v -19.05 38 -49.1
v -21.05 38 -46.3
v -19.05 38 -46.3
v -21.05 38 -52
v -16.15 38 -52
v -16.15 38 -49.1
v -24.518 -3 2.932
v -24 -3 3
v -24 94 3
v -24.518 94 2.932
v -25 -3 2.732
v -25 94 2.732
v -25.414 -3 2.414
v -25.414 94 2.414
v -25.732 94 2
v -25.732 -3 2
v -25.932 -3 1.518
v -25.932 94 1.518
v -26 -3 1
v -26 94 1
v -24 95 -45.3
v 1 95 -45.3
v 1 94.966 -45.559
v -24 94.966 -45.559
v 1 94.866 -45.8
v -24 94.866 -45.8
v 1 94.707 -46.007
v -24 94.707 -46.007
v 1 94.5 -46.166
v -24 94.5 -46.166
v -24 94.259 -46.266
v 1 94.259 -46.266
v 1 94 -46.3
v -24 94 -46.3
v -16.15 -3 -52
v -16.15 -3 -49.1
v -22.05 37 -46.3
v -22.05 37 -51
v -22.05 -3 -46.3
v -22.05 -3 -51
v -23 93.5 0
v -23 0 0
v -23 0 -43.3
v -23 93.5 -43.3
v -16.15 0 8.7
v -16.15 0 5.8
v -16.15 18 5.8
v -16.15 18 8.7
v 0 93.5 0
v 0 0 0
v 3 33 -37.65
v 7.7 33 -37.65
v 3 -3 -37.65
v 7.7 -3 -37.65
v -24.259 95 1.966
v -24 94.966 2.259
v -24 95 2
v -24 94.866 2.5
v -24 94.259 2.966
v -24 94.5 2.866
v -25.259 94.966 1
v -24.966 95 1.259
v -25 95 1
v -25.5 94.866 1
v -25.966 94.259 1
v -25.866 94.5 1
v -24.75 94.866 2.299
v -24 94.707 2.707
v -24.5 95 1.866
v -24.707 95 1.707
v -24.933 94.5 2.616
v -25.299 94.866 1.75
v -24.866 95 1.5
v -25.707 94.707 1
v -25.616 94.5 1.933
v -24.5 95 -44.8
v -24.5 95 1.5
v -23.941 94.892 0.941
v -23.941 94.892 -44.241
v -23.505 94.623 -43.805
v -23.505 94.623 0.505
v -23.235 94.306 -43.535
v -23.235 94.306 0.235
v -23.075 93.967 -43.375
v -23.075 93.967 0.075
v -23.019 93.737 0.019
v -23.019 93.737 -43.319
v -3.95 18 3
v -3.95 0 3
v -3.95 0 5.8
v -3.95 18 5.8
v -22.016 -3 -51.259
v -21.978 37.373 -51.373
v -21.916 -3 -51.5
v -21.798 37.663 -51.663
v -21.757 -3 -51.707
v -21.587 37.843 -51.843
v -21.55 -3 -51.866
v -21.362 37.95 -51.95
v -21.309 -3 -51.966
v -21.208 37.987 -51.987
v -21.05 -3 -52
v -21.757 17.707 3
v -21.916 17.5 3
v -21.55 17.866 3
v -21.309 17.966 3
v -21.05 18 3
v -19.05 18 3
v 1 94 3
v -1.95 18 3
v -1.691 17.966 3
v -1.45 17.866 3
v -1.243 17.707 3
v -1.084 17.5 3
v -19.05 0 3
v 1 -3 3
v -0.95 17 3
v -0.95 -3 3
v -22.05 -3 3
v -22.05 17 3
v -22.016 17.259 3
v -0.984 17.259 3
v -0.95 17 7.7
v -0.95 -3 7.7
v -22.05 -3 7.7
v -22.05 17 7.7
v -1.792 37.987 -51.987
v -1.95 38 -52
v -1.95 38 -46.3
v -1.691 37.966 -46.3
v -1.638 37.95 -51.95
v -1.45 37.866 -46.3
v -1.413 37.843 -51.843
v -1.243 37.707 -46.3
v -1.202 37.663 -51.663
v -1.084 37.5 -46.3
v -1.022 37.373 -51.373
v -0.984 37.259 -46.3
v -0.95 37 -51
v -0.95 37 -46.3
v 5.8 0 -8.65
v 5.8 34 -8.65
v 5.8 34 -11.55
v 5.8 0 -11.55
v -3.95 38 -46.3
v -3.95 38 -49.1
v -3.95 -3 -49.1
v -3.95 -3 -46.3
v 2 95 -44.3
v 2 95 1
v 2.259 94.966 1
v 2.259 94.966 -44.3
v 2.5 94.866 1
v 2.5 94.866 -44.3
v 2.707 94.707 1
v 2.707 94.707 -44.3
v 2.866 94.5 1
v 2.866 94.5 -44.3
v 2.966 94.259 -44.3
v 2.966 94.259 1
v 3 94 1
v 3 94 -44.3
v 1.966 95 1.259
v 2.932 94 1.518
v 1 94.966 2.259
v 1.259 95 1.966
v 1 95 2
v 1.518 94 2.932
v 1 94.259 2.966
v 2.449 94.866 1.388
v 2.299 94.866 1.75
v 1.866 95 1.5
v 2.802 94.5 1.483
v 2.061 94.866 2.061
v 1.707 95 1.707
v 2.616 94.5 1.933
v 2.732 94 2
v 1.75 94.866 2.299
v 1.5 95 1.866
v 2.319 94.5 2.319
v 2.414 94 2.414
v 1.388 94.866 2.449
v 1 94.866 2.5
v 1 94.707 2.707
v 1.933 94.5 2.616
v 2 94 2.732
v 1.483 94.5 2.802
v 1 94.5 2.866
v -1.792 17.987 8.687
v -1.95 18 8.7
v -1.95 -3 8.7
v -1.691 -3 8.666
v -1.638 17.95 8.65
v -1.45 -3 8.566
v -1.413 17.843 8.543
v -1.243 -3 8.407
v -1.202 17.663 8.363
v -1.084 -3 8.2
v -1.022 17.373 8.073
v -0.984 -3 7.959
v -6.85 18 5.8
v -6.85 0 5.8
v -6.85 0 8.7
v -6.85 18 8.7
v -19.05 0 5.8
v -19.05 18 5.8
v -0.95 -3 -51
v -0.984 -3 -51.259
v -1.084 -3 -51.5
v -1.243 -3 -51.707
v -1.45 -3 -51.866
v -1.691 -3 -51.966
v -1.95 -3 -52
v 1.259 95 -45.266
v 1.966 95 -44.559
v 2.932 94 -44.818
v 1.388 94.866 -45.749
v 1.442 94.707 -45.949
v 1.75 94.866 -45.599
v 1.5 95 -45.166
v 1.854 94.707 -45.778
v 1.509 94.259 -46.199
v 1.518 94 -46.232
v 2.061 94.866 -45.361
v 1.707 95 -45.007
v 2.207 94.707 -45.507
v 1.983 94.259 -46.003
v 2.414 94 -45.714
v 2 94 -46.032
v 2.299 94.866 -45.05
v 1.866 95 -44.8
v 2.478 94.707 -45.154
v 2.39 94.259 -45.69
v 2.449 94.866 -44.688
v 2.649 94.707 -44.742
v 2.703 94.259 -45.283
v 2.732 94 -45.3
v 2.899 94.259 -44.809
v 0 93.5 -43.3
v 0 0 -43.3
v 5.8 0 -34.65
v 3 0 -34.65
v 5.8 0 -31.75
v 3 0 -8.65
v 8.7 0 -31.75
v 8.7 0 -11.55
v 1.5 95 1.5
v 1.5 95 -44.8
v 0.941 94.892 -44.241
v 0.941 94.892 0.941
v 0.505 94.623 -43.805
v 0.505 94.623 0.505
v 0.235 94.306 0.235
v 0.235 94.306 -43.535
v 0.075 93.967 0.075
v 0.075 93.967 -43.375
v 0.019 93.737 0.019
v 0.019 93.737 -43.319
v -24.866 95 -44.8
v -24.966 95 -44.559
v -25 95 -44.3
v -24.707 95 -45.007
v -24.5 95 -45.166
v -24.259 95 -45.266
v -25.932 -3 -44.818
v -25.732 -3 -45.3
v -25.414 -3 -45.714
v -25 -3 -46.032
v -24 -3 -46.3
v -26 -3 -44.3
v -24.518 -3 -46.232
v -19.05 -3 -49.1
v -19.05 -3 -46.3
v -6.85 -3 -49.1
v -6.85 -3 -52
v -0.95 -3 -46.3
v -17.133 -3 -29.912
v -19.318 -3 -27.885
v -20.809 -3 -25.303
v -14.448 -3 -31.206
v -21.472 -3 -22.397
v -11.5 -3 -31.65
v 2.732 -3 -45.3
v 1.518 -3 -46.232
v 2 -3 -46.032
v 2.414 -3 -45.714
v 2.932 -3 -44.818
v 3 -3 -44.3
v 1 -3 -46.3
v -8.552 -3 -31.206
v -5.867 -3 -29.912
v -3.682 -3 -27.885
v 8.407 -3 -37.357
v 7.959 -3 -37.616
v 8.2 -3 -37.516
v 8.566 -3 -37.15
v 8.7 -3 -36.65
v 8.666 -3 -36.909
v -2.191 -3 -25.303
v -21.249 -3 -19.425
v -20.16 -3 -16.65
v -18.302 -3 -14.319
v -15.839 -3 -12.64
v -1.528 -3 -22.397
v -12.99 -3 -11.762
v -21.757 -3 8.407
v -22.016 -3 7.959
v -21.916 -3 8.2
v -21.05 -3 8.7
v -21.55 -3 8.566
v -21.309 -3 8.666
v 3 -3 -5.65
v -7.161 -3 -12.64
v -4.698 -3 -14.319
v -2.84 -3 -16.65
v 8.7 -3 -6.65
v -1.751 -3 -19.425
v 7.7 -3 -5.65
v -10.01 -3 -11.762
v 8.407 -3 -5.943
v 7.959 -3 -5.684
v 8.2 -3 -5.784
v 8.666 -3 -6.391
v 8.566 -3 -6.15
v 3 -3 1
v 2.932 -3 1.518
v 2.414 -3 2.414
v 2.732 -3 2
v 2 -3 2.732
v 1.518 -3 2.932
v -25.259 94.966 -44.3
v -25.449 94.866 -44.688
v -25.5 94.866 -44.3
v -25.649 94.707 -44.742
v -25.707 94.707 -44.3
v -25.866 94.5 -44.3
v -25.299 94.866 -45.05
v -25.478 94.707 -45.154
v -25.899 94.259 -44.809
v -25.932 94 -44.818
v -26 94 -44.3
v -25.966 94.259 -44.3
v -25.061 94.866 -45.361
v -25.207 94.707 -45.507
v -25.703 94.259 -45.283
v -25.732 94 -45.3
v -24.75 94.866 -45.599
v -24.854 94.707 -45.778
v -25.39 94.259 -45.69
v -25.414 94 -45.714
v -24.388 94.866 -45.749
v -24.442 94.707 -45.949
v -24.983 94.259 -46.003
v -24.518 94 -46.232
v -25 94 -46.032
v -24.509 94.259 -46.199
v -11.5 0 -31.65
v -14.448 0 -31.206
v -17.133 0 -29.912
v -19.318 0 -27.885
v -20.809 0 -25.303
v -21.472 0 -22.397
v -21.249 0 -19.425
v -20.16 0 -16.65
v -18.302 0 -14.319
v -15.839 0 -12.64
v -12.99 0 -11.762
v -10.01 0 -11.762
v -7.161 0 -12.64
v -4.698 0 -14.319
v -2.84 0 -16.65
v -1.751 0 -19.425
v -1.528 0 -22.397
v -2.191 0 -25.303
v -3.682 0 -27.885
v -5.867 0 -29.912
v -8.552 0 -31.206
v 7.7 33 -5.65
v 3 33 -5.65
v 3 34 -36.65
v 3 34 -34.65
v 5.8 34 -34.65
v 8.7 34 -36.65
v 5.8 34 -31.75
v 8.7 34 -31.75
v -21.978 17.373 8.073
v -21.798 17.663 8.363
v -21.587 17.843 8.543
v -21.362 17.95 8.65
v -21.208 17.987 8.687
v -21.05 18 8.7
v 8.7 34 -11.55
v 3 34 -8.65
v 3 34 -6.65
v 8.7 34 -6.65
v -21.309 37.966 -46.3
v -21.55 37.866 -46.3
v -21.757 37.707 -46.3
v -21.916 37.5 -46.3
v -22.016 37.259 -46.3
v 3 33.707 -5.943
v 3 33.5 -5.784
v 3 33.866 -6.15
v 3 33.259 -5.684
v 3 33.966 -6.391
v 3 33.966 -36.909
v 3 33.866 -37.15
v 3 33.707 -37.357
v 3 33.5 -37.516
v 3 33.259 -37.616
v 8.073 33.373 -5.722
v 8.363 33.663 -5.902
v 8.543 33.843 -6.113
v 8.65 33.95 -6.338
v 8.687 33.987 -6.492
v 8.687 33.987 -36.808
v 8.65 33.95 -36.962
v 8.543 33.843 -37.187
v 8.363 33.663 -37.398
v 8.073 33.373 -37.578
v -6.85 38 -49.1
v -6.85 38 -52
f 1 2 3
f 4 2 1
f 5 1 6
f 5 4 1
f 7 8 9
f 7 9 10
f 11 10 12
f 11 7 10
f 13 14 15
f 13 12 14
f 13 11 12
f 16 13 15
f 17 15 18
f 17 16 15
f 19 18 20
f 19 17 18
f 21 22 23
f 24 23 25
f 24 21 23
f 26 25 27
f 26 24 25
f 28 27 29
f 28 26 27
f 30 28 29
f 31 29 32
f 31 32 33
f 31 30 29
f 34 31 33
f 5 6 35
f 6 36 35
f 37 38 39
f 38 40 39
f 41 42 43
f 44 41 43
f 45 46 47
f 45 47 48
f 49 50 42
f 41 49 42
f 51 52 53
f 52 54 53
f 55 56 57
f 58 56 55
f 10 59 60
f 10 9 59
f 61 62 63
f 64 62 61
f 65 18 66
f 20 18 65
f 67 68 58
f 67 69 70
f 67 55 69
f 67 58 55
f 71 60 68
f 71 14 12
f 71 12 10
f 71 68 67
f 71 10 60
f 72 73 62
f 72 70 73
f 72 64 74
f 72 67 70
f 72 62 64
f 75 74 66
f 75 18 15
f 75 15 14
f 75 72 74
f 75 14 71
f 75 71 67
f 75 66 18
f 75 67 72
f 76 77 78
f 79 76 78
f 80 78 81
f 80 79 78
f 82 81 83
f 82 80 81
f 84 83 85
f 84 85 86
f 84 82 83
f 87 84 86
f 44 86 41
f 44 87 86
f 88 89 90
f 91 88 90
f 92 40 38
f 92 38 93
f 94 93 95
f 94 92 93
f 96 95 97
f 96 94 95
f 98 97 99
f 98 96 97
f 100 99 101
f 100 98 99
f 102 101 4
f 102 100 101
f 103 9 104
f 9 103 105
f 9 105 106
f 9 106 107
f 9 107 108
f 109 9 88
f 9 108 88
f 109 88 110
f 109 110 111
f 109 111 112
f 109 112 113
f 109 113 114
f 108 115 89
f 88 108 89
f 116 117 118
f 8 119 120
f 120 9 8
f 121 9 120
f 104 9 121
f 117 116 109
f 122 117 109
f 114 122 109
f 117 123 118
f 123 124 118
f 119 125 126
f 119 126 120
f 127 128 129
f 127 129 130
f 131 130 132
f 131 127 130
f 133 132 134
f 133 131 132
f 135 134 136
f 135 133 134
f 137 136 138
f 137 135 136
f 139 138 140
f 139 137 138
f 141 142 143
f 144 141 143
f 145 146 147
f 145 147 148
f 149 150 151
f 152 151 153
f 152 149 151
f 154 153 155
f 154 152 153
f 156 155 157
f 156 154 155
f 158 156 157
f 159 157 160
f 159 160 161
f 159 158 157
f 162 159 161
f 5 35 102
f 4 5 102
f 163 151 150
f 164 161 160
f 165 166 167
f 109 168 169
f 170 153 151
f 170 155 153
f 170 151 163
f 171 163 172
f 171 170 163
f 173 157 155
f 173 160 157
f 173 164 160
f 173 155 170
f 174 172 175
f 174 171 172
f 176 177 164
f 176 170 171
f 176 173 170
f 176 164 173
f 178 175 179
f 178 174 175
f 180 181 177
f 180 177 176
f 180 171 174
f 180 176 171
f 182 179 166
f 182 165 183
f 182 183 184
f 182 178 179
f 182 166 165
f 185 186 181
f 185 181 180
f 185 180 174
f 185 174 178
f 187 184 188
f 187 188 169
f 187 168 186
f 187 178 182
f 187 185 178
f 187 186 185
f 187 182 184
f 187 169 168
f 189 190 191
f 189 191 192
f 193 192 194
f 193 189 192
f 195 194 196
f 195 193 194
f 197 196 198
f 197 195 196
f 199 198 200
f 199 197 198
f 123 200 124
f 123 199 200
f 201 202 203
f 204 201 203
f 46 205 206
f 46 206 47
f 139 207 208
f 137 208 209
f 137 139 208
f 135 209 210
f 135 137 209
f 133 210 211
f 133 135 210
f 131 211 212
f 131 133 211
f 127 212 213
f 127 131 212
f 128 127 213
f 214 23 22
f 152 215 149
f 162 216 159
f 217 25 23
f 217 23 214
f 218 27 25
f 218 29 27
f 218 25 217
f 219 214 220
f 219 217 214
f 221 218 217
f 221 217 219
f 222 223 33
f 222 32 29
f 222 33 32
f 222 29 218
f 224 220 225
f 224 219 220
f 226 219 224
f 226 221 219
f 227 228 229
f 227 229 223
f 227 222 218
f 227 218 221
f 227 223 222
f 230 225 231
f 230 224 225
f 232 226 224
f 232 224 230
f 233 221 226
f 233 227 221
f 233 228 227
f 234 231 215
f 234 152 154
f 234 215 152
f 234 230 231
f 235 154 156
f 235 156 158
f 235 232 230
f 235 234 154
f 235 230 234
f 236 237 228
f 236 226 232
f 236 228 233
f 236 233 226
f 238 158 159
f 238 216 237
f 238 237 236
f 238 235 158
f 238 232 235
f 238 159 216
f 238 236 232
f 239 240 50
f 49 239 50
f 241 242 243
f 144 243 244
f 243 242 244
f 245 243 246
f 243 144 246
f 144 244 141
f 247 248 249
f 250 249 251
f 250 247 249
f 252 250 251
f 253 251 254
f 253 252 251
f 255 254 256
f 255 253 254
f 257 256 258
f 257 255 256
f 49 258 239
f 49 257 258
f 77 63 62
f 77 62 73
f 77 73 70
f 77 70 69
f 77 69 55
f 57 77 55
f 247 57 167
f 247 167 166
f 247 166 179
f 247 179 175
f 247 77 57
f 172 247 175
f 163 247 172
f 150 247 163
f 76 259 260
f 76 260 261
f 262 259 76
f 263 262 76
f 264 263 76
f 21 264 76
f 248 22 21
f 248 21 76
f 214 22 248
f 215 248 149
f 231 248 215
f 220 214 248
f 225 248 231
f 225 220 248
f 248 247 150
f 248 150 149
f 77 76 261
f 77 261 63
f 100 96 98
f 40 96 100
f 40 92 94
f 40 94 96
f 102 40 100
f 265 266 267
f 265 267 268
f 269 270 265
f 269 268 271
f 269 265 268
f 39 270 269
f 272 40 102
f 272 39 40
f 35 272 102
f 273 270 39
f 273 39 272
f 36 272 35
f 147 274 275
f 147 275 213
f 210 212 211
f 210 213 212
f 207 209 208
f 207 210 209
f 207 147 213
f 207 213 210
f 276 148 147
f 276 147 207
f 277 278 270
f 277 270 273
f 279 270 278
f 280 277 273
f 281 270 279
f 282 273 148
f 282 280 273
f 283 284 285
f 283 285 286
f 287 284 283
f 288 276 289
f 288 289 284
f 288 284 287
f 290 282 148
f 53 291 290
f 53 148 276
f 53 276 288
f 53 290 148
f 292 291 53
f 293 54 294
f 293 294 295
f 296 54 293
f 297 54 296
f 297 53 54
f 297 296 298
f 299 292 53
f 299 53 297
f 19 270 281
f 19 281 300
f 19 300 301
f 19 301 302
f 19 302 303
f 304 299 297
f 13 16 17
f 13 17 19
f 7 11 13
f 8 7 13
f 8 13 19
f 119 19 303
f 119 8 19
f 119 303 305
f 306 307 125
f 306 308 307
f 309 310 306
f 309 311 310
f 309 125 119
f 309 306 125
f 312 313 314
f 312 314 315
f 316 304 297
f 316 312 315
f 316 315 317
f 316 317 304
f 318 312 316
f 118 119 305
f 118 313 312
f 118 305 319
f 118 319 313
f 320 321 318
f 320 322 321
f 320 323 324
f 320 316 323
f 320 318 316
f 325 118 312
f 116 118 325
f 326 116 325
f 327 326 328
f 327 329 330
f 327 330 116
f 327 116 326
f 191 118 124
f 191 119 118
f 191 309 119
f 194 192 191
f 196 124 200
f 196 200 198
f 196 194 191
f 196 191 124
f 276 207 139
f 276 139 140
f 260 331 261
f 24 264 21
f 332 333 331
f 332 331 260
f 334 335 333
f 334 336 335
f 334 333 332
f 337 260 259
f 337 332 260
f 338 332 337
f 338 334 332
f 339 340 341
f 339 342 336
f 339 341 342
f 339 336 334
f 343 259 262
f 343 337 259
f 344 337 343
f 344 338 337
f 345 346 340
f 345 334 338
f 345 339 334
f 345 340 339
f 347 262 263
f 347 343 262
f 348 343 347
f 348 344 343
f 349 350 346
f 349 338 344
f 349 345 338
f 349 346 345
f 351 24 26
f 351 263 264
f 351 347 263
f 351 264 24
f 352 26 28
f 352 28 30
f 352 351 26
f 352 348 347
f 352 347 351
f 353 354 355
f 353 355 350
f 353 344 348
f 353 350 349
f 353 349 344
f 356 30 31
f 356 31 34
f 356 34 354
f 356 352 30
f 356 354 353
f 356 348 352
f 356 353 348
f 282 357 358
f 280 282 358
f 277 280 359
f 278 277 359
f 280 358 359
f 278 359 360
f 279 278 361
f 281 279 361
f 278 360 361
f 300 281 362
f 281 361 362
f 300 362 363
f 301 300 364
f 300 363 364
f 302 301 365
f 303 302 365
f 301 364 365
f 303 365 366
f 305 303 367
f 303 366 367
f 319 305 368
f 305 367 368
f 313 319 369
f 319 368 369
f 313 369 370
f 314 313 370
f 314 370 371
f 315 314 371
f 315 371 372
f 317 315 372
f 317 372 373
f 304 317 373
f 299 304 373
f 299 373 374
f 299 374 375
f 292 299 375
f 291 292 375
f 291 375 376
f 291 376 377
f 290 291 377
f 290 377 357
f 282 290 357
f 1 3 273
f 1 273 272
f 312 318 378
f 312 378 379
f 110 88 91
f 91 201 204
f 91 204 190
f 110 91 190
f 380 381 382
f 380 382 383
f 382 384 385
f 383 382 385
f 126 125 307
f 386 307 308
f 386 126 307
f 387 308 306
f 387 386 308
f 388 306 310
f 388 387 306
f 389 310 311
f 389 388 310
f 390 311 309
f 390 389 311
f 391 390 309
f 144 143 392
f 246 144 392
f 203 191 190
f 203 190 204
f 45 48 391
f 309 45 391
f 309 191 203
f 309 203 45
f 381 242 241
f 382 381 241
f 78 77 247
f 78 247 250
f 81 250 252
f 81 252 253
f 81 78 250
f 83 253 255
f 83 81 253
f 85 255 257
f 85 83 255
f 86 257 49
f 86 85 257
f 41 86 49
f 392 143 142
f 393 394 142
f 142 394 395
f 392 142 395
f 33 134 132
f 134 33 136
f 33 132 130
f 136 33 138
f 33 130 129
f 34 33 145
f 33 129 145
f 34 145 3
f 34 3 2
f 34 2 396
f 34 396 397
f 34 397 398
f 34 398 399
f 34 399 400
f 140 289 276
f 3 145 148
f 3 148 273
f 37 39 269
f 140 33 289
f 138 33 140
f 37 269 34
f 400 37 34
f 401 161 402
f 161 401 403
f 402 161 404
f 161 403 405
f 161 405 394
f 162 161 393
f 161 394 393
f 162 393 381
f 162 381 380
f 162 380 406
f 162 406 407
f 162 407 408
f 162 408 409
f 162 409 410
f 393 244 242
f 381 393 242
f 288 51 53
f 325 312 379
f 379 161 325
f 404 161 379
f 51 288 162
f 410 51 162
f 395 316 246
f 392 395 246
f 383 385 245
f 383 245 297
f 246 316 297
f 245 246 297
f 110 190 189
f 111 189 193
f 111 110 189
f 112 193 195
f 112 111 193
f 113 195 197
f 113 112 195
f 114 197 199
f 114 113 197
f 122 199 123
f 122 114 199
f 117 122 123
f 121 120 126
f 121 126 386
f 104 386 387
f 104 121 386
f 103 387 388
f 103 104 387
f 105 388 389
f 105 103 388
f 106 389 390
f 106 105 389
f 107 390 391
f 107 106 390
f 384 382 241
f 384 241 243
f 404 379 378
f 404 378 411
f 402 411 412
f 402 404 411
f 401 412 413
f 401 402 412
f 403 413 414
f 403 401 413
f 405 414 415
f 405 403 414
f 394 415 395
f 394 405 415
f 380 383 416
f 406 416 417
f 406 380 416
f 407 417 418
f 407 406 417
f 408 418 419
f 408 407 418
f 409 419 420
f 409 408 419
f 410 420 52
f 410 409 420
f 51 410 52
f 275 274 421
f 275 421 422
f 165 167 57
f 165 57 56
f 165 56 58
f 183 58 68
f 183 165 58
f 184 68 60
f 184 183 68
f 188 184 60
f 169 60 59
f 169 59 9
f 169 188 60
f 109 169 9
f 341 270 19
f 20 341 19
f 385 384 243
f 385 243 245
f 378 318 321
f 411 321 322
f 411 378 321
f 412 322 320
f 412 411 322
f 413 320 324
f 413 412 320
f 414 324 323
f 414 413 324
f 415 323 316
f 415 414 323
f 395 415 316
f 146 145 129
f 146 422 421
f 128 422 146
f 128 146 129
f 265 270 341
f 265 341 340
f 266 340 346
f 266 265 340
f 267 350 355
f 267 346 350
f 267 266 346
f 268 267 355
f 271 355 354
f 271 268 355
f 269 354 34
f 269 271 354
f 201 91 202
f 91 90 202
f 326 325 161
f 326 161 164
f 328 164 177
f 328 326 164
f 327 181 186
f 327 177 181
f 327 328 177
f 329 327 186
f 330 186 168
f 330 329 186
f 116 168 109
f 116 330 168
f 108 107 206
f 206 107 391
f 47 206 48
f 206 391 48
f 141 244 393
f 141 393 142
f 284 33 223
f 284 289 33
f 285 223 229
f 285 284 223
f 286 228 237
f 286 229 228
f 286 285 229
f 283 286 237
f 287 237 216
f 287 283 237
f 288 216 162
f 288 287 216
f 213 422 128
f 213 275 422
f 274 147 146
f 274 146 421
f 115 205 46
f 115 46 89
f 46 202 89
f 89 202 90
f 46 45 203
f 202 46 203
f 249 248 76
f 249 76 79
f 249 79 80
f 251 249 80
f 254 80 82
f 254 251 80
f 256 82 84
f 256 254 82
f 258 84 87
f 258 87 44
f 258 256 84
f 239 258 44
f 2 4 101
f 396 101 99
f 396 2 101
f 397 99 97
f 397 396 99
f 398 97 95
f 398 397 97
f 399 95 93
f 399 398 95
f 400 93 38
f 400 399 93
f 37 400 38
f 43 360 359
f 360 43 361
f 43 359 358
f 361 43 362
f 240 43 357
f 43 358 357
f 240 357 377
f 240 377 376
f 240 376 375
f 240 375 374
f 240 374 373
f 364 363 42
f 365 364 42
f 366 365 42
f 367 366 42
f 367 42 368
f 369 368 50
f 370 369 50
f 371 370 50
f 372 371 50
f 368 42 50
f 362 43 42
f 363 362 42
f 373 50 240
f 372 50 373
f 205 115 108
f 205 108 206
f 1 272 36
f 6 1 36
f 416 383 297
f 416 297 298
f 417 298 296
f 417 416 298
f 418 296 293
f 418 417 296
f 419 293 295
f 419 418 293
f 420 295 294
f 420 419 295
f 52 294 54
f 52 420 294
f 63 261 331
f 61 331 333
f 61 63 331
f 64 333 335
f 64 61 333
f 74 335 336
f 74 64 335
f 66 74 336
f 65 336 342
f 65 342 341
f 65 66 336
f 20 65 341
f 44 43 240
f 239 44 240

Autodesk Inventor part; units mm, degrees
ref_plane "YZ Plane" through (0, 0, 0) normal (1, 0, 0) x (0, 1, 0)
ref_plane "XZ Plane" through (0, 0, 0) normal (0, 1, 0) x (-1, 0, 0)
ref_plane "XY Plane" through (0, 0, 0) normal (0, 0, 1) x (1, 0, 0)
sketch "Boceto1" plane through (0, 0, 0) normal (0, 1, 0) x (-1, 0, 0)
  line L0 (0, 0) -> (23, 0)
  line L1 (23, 0) -> (23, -43.3)
  line L2 (23, -43.3) -> (0, -43.3)
  line L3 (0, -43.3) -> (0, 0)
  dimension "d0" = 23
  dimension "d1" = 43.3
ref_plane "Plano de trabajo1" through (0, 92, 0) normal (0, 1, 0) x (1, 0, 0)
sketch "Boceto2" plane through (0, 92, 0) normal (0, 1, 0) x (1, 0, 0)
  line L0 (0, 43.3) -> (-23, 43.3) projected
  line L1 (-23, 43.3) -> (-23, 0) projected
  line L2 (-23, 0) -> (0, 0) projected
  line L3 (0, 0) -> (0, 43.3) projected
  line L4 (-26, -1) -> (-26, 44.3)
  line L5 (-24, 46.3) -> (1, 46.3)
  line L6 (3, 44.3) -> (3, -1)
  line L7 (1, -3) -> (-24, -3)
  arc A0 (-26, -1) -> (-24, -3) centre (-24, -1) ccw
  arc A1 (1, -3) -> (3, -1) centre (1, -1) ccw
  arc A2 (3, 44.3) -> (1, 46.3) centre (1, 44.3) ccw
  arc A3 (-24, 46.3) -> (-26, 44.3) centre (-24, 44.3) ccw
  point P0 (-11.5, 21.65)
  point P1 (-26, -3)
  point P2 (-26, 46.3)
  point P3 (3, 46.3)
  point P4 (3, -3)
  dimension "d4" = 21.65
  dimension "d5" = 11.5
  dimension "d6" = 3
  dimension "d9" = 2
extrude "Extrusión2" add sketch "Boceto2" against normal blind 92
sketch "Boceto3" plane through (0, 0, 0) normal (0, -1, 0) x (1, 0, 0)
  line L0 (3, -44.3) -> (3, 1) projected
  arc A0 (3, 1) -> (1, 3) centre (1, 1) ccw projected
  line L1 (1, 3) -> (-24, 3) projected
  arc A1 (-24, 3) -> (-26, 1) centre (-24, 1) ccw projected
  line L2 (-26, 1) -> (-26, -44.3) projected
  arc A2 (-26, -44.3) -> (-24, -46.3) centre (-24, -44.3) ccw projected
  line L3 (-24, -46.3) -> (1, -46.3) projected
  arc A3 (1, -46.3) -> (3, -44.3) centre (1, -44.3) ccw projected
  point P0 (0, 0)
extrude "Extrusión3" add sketch "Boceto3" along normal blind 3
sketch "Boceto4" plane through (0, -3, 0) normal (0, -1, 0) x (1, 0, 0)
  line L0 (3, -44.3) -> (3, 1) projected
  line L1 (3, -8.65) -> (5.8, -8.65)
  line L2 (5.8, -8.65) -> (5.8, -11.55)
  line L3 (5.8, -11.55) -> (8.7, -11.55)
  line L4 (8.7, -11.55) -> (8.7, -5.65)
  line L5 (8.7, -5.65) -> (3, -5.65)
  line L6 (3, -21.65) -> (22.5352, -21.65) construction
  line L7 (3, -34.65) -> (5.8, -34.65)
  line L8 (5.8, -34.65) -> (5.8, -31.75)
  line L9 (5.8, -31.75) -> (8.7, -31.75)
  line L10 (8.7, -31.75) -> (8.7, -37.65)
  line L11 (8.7, -37.65) -> (3, -37.65)
  point P0 (0, 0)
  point P1 (3, -37.65)
  dimension "d12" = 2.8
  dimension "d13" = 2.9
  dimension "d14" = 2.9
  dimension "d15" = 5.9
  dimension "d16" = 13
extrude "Extrusión4" add sketch "Boceto4" against normal blind 37
sketch "Boceto5" plane through (0, -3, 0) normal (0, -1, 0) x (1, 0, 0)
  line L0 (3, -34.65) -> (3, -8.65) projected
  line L1 (3, -8.65) -> (5.8, -8.65) projected
  line L2 (5.8, -8.65) -> (5.8, -11.55) projected
  line L3 (5.8, -31.75) -> (5.8, -34.65) projected
  line L4 (5.8, -34.65) -> (3, -34.65) projected
  line L5 (5.8, -11.55) -> (8.7, -11.55) projected
  line L6 (8.7, -31.75) -> (5.8, -31.75) projected
  line L7 (8.7, -11.55) -> (8.7, -31.75)
  point P0 (0, 0)
extrude "Extrusión5" add sketch "Boceto5" against normal blind 3
sketch "Boceto6" plane through (0, -3, 0) normal (0, -1, 0) x (1, 0, 0)
  arc A0 (3, 1) -> (1, 3) centre (1, 1) ccw projected
  line L0 (1, 3) -> (-24, 3) projected
  arc A1 (-24, 3) -> (-26, 1) centre (-24, 1) ccw projected
  line L1 (-26, 1) -> (-26, -44.3) projected
  arc A2 (-26, -44.3) -> (-24, -46.3) centre (-24, -44.3) ccw projected
  line L2 (-24, -46.3) -> (1, -46.3) projected
  arc A3 (1, -46.3) -> (3, -44.3) centre (1, -44.3) ccw projected
  line L3 (3, -44.3) -> (3, -37.65) projected
  line L4 (3, -37.65) -> (8.7, -37.65) projected
  line L5 (8.7, -37.65) -> (8.7, -5.65) projected
  line L6 (8.7, -5.65) -> (3, -5.65) projected
  line L7 (3, -5.65) -> (3, 1) projected
  line L8 (0, -43.3) -> (-23, -43.3) projected
  line L9 (3, -8.65) -> (3, -34.65) projected
  point P0 (0, 0)
  point P1 (-11.5, -21.65)
  dimension "d21" = 21.65
  dimension "d22" = 14.5
hole "Agujero1" at (-11.5, -3, -21.65) direction (0, 1, 0) diameter 20 end through all
sketch "Boceto7" plane through (0, -3, 0) normal (0, -1, 0) x (1, 0, 0)
  line L0 (1, 3) -> (-24, 3) projected
  line L1 (-3.95, 3) -> (-3.95, 5.8)
  line L2 (-3.95, 5.8) -> (-6.85, 5.8)
  line L3 (-6.85, 5.8) -> (-6.85, 8.7)
  line L4 (-6.85, 8.7) -> (-0.95, 8.7)
  line L5 (-0.95, 8.7) -> (-0.95, 3)
  line L6 (-11.5, 3) -> (-11.5, 18.2857) construction
  line L7 (-19.05, 3) -> (-19.05, 5.8)
  line L8 (-19.05, 5.8) -> (-16.15, 5.8)
  line L9 (-16.15, 5.8) -> (-16.15, 8.7)
  line L10 (-16.15, 8.7) -> (-22.05, 8.7)
  line L11 (-22.05, 8.7) -> (-22.05, 3)
  line L12 (8.7, -11.55) -> (8.7, -31.75) construction
  line L13 (8.7, -21.65) -> (17.1818, -21.65) construction
  line L14 (1, -46.3) -> (-24, -46.3)
  line L15 (-3.95, -46.3) -> (-3.95, -49.1)
  line L16 (-3.95, -49.1) -> (-6.85, -49.1)
  line L17 (-6.85, -49.1) -> (-6.85, -52)
  line L18 (-6.85, -52) -> (-0.95, -52)
  line L19 (-0.95, -52) -> (-0.95, -46.3)
  line L20 (-16.15, -52) -> (-22.05, -52)
  line L21 (-16.15, -49.1) -> (-16.15, -52)
  line L22 (-19.05, -49.1) -> (-16.15, -49.1)
  line L23 (-19.05, -46.3) -> (-19.05, -49.1)
  line L24 (-22.05, -52) -> (-22.05, -46.3)
  point P0 (0, 0)
  dimension "d30" = 2.8
  dimension "d31" = 2.9
  dimension "d32" = 2.9
  dimension "d33" = 5.9
  dimension "d34" = 7.55
extrude "Extrusión6" add sketch "Boceto7" against normal blind 21
sketch "Boceto8" plane through (0, -3, 0) normal (0, -1, 0) x (1, 0, 0)
  circle A0 centre (-11.5, -21.65) radius 10 projected
  arc A1 (3, 1) -> (1, 3) centre (1, 1) ccw projected
  line L0 (1, 3) -> (-0.95, 3) projected
  line L1 (-0.95, 3) -> (-0.95, 8.7) projected
  line L2 (-0.95, 8.7) -> (-6.85, 8.7) projected
  line L3 (-6.85, 8.7) -> (-6.85, 5.8) projected
  line L4 (-6.85, 5.8) -> (-3.95, 5.8) projected
  line L5 (-3.95, 5.8) -> (-3.95, 3) projected
  line L6 (-3.95, 3) -> (-19.05, 3) projected
  line L7 (-19.05, 3) -> (-19.05, 5.8) projected
  line L8 (-19.05, 5.8) -> (-16.15, 5.8) projected
  line L9 (-16.15, 5.8) -> (-16.15, 8.7) projected
  line L10 (-16.15, 8.7) -> (-22.05, 8.7) projected
  line L11 (-22.05, 8.7) -> (-22.05, 3) projected
  line L12 (-22.05, 3) -> (-24, 3) projected
  arc A2 (-24, 3) -> (-26, 1) centre (-24, 1) ccw projected
  line L13 (-26, 1) -> (-26, -44.3) projected
  arc A3 (-26, -44.3) -> (-24, -46.3) centre (-24, -44.3) ccw projected
  line L14 (-24, -46.3) -> (-22.05, -46.3) projected
  line L15 (-22.05, -46.3) -> (-22.05, -52) projected
  line L16 (-22.05, -52) -> (-16.15, -52) projected
  line L17 (-16.15, -52) -> (-16.15, -49.1) projected
  line L18 (-16.15, -49.1) -> (-19.05, -49.1) projected
  line L19 (-19.05, -49.1) -> (-19.05, -46.3) projected
  line L20 (-19.05, -46.3) -> (-3.95, -46.3) projected
  line L21 (-3.95, -46.3) -> (-3.95, -49.1) projected
  line L22 (-3.95, -49.1) -> (-6.85, -49.1) projected
  line L23 (-6.85, -49.1) -> (-6.85, -52) projected
  line L24 (-6.85, -52) -> (-0.95, -52) projected
  line L25 (-0.95, -52) -> (-0.95, -46.3) projected
  line L26 (-0.95, -46.3) -> (1, -46.3) projected
  arc A4 (1, -46.3) -> (3, -44.3) centre (1, -44.3) ccw projected
  line L27 (3, -44.3) -> (3, -37.65) projected
  line L28 (3, -37.65) -> (8.7, -37.65) projected
  line L29 (8.7, -37.65) -> (8.7, -5.65) projected
  line L30 (8.7, -5.65) -> (3, -5.65) projected
  line L31 (3, -5.65) -> (3, 1) projected
  line L32 (-6.85, 8.7) -> (-16.15, 8.7)
  line L33 (-6.85, -52) -> (-16.15, -52)
  point P0 (0, 0)
extrude "Extrusión7" add sketch "Boceto8" against normal blind 3 contours L3 L4 L5 L6 L7 L8 L9 L32
sketch "Boceto9" plane through (0, 92, 0) normal (0, 1, 0) x (1, 0, 0)
  line L0 (3, -1) -> (3, 44.3) projected
  arc A0 (3, 44.3) -> (1, 46.3) centre (1, 44.3) ccw projected
  line L1 (1, 46.3) -> (-24, 46.3) projected
  arc A1 (-24, 46.3) -> (-26, 44.3) centre (-24, 44.3) ccw projected
  line L2 (-26, 44.3) -> (-26, -1) projected
  arc A2 (-26, -1) -> (-24, -3) centre (-24, -1) ccw projected
  line L3 (-24, -3) -> (1, -3) projected
  arc A3 (1, -3) -> (3, -1) centre (1, -1) ccw projected
  line L4 (0, 43.3) -> (0, 0) projected
  line L5 (0, 0) -> (-23, 0) projected
  line L6 (-23, 0) -> (-23, 43.3) projected
  line L7 (-23, 43.3) -> (0, 43.3) projected
extrude "Extrusión8" add sketch "Boceto9" along normal blind 3
fillet "Empalme1" radius 1.5 4 edges at (-11.5, 95, 0) (0, 95, -21.65) (-23, 95, -21.65) (-11.5, 95, -43.3)
fillet "Empalme2" radius 1 8 edges at (2.4142, 95, 2.4142) (3, 95, -21.65) (2.4142, 95, -45.7142) (-11.5, 95, -46.3) (-25.4142, 95, -45.7142) (-26, 95, -21.65) (-25.4142, 95, 2.4142) (-11.5, 95, 3)
sketch "Boceto10" plane through (0, 18, 0) normal (0, 1, 0) x (1, 0, 0)
  line L0 (-0.95, 46.3) -> (-0.95, 52) projected
  line L1 (-0.95, 52) -> (-6.85, 52) projected
  line L2 (-6.85, 52) -> (-6.85, 49.1) projected
  line L3 (-6.85, 49.1) -> (-3.95, 49.1) projected
  line L4 (-3.95, 49.1) -> (-3.95, 46.3) projected
  line L5 (-0.95, 46.3) -> (-3.95, 46.3) projected
  line L6 (-16.15, 49.1) -> (-16.15, 52) projected
  line L7 (-16.15, 52) -> (-22.05, 52) projected
  line L8 (-22.05, 52) -> (-22.05, 46.3) projected
  line L9 (-19.05, 46.3) -> (-22.05, 46.3) projected
  line L10 (-19.05, 46.3) -> (-19.05, 49.1) projected
  line L11 (-19.05, 49.1) -> (-16.15, 49.1) projected
  point P0 (0, 0)
extrude "Extrusión9" add sketch "Boceto10" along normal blind 20
fillet "Empalme3" radius 1 12 edges at (8.7, 15.5, -37.65) (8.7, 15.5, -5.65) (-0.95, 7.5, 8.7) (-22.05, 7.5, 8.7) (5.85, 34, -37.65) (5.85, 34, -5.65) (-0.95, 18, 5.85) (-22.05, 18, 5.85) (-0.95, 17.5, -52) (-0.95, 38, -49.15) (-22.05, 17.5, -52) (-22.05, 38, -49.15)
properties part number "cajaPilas"
